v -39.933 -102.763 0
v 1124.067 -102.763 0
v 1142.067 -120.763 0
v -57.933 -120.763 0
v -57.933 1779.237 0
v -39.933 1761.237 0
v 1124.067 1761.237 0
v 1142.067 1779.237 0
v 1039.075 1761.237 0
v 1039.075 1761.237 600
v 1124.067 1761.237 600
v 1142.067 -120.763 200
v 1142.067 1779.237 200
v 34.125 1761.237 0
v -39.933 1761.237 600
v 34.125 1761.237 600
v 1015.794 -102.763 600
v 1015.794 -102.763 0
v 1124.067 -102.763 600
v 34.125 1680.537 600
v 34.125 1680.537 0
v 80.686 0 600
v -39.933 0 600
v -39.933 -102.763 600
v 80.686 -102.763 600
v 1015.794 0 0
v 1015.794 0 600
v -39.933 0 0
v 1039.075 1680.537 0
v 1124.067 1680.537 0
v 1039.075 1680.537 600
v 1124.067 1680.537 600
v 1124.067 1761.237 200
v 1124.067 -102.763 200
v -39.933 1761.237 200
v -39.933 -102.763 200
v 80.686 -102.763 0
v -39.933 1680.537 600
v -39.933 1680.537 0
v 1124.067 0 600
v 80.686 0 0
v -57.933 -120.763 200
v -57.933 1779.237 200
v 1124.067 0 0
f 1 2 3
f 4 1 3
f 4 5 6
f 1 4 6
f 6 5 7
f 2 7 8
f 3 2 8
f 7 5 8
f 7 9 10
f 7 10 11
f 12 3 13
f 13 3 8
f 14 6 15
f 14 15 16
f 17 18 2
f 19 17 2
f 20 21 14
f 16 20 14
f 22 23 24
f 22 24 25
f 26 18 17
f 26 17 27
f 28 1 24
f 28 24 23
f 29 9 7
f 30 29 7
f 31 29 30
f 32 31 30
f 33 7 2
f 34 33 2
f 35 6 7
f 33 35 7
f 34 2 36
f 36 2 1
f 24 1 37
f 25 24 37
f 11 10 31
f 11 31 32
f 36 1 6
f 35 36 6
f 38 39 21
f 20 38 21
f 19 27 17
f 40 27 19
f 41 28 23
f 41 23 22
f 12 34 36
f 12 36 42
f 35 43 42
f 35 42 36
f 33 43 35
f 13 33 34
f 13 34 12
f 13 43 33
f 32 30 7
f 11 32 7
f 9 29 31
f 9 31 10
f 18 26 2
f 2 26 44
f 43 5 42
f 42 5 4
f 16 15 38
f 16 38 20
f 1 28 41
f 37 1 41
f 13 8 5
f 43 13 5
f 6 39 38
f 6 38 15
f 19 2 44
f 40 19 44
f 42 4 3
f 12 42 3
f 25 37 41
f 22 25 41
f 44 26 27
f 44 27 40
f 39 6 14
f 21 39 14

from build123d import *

# Parameters (mm, degrees)
F0_W     = 74.0577807724
F0_H     = 80.7005994424
F1_DEPTH = 600
F0_W_2   = 84.9921652377
F0_W_3   = 120.619170934
F0_H_2   = 102.7626535788
F0_W_4   = 108.2729050219
F0_W_5   = 1004.9500539899
F0_H_3   = 18
F0_W_6   = 935.1079240441
F2_DEPTH = 200


with BuildPart() as f1:
    # F0 (on Top) → F1 (new body)
    with BuildSketch(Plane.XY):
        with Locations((-2.9038081914, 1720.8870467)):
            Rectangle(F0_W, F0_H)
    extrude(amount=F1_DEPTH)


with BuildPart() as f1b:
    # F0 (on Top) → F1, piece 2 (new body)
    with BuildSketch(Plane.XY):
        with Locations((1081.5712188035, 1720.8870467)):
            Rectangle(F0_W_2, F0_H)
    extrude(amount=F1_DEPTH)


with BuildPart() as f1c:
    # F0 (on Top) → F1, piece 3 (new body)
    with BuildSketch(Plane.XY):
        with Locations((20.3768868893, -51.3813267894)):
            Rectangle(F0_W_3, F0_H_2)
    extrude(amount=F1_DEPTH)


with BuildPart() as f1d:
    # F0 (on Top) → F1, piece 4 (new body)
    with BuildSketch(Plane.XY):
        with Locations((1069.9308489114, -51.3813267894)):
            Rectangle(F0_W_4, F0_H_2)
    extrude(amount=F1_DEPTH)


with BuildPart() as f2:
    # F0 (on Top) → F2 (new body)
    with BuildSketch(Plane.XY):
        Polygon((34.1250821948, 1779.2373464212), (-57.9326985776, 1779.2373464212), (-57.9326985776, 1680.5367469788), (-39.9326985776, 1680.5367469788), (-39.9326985776, 1761.2373464212), (34.1250821948, 1761.2373464212), align=None)
        with Locations((536.6001091897, 1770.2373464212)):
            Rectangle(F0_W_5, F0_H_3)
        Polygon((-39.9326985776, 1680.5367469788), (-57.9326985776, 1680.5367469788), (-57.9326985776, 0), (-39.9326985776, 0), (-39.9326985776, 160.1675599813), (-39.9326985776, 280.4511785507), (-39.9326985776, 567.5797462463), (-39.9326985776, 695.6235766411), (-39.9326985776, 1126.3164281845), (-39.9326985776, 1219.4391489029), (-39.9326985776, 1461.0304832458), (-39.9326985776, 1519.7958946228), (-39.9326985776, 1628.6848783493), align=None)
        with Locations((1081.5712188035, 1770.2373464212)):
            Rectangle(F0_W_2, F0_H_3)
        Polygon((-39.9326985776, 0), (-57.9326985776, 0), (-57.9326985776, -120.7626535788), (80.6864723563, -120.7626535788), (80.6864723563, -102.7626535788), (-39.9326985776, -102.7626535788), align=None)
        Polygon((1142.0673014224, 1779.2373464212), (1124.0673014224, 1779.2373464212), (1124.0673014224, 1761.2373464212), (1124.0673014224, 1680.5367469788), (1142.0673014224, 1680.5367469788), align=None)
        with Locations((548.2404343784, -111.7626535788)):
            Rectangle(F0_W_6, F0_H_3)
        Polygon((1124.0673014224, 1680.5367469788), (1124.0673014224, 1628.6848783493), (1124.0673014224, 1519.7958946228), (1124.0673014224, 1461.0304832458), (1124.0673014224, 1219.4391489029), (1124.0673014224, 1126.3164281845), (1124.0673014224, 695.6235766411), (1124.0673014224, 567.5797462463), (1124.0673014224, 280.4511785507), (1124.0673014224, 160.1675599813), (1124.0673014224, 0), (1142.0673014224, 0), (1142.0673014224, 1680.5367469788), align=None)
        Polygon((1015.7943964005, -102.7626535788), (1015.7943964005, -120.7626535788), (1142.0673014224, -120.7626535788), (1142.0673014224, 0), (1124.0673014224, 0), (1124.0673014224, -102.7626535788), align=None)
    extrude(amount=F2_DEPTH)


solid = Compound([f1.part, f1b.part, f1c.part, f1d.part, f2.part])
